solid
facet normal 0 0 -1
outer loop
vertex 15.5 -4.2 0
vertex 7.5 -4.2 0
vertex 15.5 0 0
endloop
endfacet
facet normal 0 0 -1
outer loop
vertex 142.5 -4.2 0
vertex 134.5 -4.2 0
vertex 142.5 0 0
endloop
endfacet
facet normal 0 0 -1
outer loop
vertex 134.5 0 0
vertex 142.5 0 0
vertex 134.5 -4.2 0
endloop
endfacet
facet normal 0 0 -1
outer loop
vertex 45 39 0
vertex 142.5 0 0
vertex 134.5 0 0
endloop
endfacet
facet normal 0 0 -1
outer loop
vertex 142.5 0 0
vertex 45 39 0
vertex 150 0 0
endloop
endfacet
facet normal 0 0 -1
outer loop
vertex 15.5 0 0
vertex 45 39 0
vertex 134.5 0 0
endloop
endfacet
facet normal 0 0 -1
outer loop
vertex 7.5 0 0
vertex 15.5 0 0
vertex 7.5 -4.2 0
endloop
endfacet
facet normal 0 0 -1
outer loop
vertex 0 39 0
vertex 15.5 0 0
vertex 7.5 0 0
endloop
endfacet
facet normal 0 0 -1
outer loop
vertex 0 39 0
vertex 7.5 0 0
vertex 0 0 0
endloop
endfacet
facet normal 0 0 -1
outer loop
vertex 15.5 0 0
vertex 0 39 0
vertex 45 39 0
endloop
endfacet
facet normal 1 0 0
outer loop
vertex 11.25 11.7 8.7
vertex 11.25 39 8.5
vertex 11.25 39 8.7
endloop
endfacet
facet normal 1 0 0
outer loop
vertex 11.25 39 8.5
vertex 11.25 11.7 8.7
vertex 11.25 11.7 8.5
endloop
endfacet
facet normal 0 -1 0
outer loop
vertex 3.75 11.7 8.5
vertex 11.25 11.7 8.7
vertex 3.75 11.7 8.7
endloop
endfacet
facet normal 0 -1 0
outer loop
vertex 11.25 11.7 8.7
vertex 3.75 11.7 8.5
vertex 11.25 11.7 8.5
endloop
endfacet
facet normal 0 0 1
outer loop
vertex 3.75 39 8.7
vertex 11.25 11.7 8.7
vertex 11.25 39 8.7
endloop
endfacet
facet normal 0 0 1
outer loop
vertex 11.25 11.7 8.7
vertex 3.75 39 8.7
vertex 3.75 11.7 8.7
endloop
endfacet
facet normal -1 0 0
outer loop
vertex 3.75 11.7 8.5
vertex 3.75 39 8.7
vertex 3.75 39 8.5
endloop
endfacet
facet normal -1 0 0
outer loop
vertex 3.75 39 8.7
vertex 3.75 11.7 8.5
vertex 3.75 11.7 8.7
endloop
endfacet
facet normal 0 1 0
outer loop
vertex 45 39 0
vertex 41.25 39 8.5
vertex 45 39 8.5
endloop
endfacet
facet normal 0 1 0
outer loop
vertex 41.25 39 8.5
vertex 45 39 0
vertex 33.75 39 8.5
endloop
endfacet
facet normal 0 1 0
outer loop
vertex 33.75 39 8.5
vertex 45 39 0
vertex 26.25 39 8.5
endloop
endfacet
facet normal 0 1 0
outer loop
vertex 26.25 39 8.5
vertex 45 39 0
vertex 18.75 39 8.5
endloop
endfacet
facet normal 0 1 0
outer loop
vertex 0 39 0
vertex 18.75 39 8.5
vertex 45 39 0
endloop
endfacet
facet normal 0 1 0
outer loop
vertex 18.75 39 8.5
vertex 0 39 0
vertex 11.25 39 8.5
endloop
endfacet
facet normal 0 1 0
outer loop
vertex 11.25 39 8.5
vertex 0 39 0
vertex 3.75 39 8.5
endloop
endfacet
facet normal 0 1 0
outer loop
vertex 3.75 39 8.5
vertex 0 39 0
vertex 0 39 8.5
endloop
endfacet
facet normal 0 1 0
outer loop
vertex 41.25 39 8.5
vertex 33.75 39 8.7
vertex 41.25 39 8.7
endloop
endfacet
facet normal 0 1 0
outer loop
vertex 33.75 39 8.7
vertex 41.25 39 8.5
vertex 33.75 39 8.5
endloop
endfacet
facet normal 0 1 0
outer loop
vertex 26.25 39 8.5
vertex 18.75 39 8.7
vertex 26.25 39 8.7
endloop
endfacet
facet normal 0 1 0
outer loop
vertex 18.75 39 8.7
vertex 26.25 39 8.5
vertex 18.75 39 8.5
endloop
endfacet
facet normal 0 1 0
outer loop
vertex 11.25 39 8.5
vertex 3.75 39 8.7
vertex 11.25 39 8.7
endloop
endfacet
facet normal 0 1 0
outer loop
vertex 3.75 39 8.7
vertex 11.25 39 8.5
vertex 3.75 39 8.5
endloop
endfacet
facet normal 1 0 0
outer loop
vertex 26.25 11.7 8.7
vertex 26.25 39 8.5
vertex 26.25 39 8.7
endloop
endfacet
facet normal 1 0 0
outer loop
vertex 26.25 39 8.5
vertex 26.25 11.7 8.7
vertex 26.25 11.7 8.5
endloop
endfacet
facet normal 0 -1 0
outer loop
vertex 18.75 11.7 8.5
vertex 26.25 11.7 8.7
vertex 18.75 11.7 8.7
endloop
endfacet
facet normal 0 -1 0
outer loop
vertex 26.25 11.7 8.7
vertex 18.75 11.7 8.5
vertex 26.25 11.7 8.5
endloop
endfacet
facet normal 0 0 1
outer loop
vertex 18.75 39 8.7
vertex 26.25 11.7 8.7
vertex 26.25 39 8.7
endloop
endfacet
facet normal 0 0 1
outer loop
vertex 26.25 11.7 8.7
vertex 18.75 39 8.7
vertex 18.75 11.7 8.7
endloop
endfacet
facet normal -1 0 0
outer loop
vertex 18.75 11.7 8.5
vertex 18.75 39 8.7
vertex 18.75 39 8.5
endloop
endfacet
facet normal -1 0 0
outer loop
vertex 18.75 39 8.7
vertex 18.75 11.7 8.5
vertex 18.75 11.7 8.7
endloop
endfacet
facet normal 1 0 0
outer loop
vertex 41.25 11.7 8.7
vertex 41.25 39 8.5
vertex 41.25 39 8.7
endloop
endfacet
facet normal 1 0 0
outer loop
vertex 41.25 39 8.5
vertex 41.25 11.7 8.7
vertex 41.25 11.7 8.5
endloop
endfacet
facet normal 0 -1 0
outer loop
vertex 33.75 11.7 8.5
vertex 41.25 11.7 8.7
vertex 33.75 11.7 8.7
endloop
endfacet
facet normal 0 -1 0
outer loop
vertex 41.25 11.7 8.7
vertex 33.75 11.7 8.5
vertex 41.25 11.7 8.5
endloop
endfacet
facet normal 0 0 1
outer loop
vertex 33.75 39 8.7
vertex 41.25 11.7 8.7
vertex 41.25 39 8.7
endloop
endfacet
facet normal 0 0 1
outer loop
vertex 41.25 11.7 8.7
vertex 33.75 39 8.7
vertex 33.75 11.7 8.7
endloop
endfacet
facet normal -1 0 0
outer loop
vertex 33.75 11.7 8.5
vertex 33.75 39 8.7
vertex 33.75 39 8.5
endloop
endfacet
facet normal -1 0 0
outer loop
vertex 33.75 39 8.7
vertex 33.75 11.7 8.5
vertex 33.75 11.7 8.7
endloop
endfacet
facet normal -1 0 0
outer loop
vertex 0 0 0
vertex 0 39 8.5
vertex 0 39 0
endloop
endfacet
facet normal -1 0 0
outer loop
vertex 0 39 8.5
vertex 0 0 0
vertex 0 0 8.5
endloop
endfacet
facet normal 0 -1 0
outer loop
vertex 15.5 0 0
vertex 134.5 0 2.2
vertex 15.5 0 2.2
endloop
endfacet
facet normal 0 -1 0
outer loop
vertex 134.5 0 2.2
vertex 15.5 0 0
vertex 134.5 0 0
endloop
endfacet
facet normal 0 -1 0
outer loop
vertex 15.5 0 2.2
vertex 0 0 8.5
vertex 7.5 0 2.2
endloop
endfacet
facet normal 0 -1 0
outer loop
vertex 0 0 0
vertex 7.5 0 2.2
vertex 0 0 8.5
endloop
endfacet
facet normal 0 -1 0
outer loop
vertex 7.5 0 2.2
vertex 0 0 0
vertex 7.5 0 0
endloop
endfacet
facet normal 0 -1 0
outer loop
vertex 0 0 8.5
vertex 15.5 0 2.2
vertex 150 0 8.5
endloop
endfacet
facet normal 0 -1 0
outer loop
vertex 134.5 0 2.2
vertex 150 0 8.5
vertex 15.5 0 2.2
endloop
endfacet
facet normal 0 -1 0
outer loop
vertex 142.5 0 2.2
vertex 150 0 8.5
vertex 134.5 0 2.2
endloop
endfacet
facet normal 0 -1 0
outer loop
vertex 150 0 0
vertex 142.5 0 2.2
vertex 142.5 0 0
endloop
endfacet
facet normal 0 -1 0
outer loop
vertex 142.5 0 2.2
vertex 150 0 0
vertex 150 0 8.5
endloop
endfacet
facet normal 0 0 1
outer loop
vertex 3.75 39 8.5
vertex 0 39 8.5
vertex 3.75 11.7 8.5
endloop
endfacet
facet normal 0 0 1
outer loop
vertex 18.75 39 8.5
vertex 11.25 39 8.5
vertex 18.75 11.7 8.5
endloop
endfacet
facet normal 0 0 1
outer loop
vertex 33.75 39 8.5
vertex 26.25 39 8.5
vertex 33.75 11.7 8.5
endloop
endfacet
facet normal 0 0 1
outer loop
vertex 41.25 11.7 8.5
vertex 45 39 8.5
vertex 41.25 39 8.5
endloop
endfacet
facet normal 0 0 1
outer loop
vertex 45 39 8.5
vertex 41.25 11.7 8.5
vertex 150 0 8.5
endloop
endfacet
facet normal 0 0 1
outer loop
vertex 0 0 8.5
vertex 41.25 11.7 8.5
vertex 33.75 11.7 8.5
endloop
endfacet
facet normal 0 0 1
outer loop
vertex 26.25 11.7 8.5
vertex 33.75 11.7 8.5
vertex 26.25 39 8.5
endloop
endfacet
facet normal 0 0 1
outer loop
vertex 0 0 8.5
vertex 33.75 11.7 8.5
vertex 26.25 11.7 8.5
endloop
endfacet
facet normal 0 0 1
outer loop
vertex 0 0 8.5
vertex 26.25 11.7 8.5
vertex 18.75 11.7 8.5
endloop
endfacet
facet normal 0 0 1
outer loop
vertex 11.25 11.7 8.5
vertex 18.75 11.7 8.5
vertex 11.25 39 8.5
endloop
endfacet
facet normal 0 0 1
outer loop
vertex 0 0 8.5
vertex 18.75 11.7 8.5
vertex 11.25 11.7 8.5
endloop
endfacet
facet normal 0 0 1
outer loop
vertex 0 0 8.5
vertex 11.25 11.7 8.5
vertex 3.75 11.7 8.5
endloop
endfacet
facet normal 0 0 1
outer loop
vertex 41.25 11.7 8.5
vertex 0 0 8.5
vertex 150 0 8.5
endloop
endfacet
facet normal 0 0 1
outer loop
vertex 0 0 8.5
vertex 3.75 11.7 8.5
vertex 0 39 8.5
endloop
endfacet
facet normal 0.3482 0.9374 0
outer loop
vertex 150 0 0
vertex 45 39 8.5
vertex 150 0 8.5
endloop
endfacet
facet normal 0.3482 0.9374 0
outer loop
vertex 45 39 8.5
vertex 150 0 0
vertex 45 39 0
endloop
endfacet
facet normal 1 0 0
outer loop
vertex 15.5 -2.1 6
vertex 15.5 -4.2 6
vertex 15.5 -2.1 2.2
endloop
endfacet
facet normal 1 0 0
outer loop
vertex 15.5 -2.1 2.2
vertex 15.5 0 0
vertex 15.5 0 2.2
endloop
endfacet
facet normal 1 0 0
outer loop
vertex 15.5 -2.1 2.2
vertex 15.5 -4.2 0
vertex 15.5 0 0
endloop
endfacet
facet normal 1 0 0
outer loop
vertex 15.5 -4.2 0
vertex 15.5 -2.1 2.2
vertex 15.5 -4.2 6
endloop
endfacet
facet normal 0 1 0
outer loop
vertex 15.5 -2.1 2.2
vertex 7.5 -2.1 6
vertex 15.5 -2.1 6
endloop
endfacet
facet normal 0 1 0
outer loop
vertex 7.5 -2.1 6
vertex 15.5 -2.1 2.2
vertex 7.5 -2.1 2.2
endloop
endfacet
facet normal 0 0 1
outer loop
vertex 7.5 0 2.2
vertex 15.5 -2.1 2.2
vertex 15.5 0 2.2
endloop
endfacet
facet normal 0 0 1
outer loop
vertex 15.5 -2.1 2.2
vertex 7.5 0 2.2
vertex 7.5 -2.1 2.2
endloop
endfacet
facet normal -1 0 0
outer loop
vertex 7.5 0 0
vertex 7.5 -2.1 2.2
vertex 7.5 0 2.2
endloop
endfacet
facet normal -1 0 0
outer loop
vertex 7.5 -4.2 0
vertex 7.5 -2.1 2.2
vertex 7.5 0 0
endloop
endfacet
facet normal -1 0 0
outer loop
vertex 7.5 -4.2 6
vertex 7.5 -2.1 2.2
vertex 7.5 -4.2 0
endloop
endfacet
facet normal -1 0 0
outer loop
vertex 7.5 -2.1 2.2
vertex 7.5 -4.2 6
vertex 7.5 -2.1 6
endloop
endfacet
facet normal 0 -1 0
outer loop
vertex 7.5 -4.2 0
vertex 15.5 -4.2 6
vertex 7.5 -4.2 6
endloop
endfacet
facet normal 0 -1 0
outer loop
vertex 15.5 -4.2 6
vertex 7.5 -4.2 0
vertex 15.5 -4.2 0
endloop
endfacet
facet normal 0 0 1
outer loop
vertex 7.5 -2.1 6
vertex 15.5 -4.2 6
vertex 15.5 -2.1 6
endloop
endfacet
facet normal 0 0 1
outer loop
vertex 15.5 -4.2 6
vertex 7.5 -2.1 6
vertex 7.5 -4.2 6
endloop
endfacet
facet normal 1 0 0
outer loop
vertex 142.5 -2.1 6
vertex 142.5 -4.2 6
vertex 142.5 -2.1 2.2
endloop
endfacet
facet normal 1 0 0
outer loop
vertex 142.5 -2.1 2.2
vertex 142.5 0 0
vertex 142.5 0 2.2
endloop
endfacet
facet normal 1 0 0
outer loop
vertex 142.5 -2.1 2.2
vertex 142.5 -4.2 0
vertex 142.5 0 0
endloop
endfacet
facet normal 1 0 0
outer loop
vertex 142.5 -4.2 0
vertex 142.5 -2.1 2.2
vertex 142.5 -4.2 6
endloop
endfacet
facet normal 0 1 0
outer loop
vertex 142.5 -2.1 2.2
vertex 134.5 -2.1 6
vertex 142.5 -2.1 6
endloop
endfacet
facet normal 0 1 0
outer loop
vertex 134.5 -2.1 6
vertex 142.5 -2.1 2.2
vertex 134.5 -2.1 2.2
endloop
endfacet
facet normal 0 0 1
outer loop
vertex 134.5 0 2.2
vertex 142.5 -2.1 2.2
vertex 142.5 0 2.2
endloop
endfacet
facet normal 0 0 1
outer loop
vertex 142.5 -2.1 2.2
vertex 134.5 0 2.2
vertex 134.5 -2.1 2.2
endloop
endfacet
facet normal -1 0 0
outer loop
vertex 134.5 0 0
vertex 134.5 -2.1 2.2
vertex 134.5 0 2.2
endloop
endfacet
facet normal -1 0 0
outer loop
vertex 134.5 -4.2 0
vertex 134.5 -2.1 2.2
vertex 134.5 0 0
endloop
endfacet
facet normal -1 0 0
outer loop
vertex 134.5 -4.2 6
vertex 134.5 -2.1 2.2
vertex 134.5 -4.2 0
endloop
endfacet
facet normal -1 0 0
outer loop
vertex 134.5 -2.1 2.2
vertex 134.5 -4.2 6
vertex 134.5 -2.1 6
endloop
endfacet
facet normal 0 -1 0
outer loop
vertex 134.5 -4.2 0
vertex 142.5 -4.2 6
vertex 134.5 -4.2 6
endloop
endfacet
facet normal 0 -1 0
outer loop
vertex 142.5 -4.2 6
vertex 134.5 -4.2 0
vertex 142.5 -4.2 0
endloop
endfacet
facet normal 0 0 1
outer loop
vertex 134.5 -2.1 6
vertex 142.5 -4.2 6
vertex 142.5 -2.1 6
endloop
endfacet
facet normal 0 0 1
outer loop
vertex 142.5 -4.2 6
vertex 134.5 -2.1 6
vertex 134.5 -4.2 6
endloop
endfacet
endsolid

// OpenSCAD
// kerb

kerb_length = 150; // mm
kerb_width = 39; // mm
kerb_height = 8.5; // mm
kerb_angle = 0.3; // %

linear_extrude(kerb_height) polygon([
    [0, 0], 
    [kerb_length, 0], 
    [kerb_length * kerb_angle, kerb_width], 
    [0, kerb_width]
]);

// hooks

hook_width = 8; // mm
hook_bend_height = 2.2; // mm
hook_bend_length = 2.1; // mm
hook_barb_height = 6; // mm
hook_barb_length = 1; // mm

linear_extrude(hook_bend_height) polygon([
    [0.05*kerb_length, 0], 
    [0.05*kerb_length + hook_width, 0], 
    [0.05*kerb_length + hook_width, -hook_bend_length], 
    [0.05*kerb_length, -hook_bend_length]
]);


linear_extrude(hook_barb_height) polygon([
    [0.05*kerb_length, -hook_bend_length], 
    [0.05*kerb_length + hook_width, -hook_bend_length], 
    [0.05*kerb_length + hook_width, -hook_bend_length-hook_bend_length], 
    [0.05*kerb_length, -hook_bend_length-hook_bend_length]
]);

linear_extrude(hook_bend_height) polygon([
    [0.95*kerb_length - hook_width, 0], 
    [0.95*kerb_length, 0], 
    [0.95*kerb_length, -hook_bend_length], 
    [0.95*kerb_length - hook_width, -hook_bend_length]
]);


linear_extrude(hook_barb_height) polygon([
    [0.95*kerb_length - hook_width, -hook_bend_length], 
    [0.95*kerb_length, -hook_bend_length], 
    [0.95*kerb_length, -hook_bend_length-hook_bend_length], 
    [0.95*kerb_length - hook_width, -hook_bend_length-hook_bend_length]
]);

// strips

strip_count = 3; // #
strip_width = 0.5; // %
strip_length = 0.7; // %
strip_height = 0.2; // mm

for(i = [0 : strip_count - 1]) {
    strip_size = strip_width * kerb_length * kerb_angle / strip_count;
    strip_offset = i * kerb_length * kerb_angle / strip_count + (1-strip_width) * kerb_length * kerb_angle / (2 * strip_count);

    linear_extrude(kerb_height + strip_height) polygon([
        [strip_offset, kerb_width],
        [strip_offset + strip_size, kerb_width],
        [strip_offset + strip_size, (1-strip_length) * kerb_width],
        [strip_offset, (1-strip_length) * kerb_width]
    ]);
}
